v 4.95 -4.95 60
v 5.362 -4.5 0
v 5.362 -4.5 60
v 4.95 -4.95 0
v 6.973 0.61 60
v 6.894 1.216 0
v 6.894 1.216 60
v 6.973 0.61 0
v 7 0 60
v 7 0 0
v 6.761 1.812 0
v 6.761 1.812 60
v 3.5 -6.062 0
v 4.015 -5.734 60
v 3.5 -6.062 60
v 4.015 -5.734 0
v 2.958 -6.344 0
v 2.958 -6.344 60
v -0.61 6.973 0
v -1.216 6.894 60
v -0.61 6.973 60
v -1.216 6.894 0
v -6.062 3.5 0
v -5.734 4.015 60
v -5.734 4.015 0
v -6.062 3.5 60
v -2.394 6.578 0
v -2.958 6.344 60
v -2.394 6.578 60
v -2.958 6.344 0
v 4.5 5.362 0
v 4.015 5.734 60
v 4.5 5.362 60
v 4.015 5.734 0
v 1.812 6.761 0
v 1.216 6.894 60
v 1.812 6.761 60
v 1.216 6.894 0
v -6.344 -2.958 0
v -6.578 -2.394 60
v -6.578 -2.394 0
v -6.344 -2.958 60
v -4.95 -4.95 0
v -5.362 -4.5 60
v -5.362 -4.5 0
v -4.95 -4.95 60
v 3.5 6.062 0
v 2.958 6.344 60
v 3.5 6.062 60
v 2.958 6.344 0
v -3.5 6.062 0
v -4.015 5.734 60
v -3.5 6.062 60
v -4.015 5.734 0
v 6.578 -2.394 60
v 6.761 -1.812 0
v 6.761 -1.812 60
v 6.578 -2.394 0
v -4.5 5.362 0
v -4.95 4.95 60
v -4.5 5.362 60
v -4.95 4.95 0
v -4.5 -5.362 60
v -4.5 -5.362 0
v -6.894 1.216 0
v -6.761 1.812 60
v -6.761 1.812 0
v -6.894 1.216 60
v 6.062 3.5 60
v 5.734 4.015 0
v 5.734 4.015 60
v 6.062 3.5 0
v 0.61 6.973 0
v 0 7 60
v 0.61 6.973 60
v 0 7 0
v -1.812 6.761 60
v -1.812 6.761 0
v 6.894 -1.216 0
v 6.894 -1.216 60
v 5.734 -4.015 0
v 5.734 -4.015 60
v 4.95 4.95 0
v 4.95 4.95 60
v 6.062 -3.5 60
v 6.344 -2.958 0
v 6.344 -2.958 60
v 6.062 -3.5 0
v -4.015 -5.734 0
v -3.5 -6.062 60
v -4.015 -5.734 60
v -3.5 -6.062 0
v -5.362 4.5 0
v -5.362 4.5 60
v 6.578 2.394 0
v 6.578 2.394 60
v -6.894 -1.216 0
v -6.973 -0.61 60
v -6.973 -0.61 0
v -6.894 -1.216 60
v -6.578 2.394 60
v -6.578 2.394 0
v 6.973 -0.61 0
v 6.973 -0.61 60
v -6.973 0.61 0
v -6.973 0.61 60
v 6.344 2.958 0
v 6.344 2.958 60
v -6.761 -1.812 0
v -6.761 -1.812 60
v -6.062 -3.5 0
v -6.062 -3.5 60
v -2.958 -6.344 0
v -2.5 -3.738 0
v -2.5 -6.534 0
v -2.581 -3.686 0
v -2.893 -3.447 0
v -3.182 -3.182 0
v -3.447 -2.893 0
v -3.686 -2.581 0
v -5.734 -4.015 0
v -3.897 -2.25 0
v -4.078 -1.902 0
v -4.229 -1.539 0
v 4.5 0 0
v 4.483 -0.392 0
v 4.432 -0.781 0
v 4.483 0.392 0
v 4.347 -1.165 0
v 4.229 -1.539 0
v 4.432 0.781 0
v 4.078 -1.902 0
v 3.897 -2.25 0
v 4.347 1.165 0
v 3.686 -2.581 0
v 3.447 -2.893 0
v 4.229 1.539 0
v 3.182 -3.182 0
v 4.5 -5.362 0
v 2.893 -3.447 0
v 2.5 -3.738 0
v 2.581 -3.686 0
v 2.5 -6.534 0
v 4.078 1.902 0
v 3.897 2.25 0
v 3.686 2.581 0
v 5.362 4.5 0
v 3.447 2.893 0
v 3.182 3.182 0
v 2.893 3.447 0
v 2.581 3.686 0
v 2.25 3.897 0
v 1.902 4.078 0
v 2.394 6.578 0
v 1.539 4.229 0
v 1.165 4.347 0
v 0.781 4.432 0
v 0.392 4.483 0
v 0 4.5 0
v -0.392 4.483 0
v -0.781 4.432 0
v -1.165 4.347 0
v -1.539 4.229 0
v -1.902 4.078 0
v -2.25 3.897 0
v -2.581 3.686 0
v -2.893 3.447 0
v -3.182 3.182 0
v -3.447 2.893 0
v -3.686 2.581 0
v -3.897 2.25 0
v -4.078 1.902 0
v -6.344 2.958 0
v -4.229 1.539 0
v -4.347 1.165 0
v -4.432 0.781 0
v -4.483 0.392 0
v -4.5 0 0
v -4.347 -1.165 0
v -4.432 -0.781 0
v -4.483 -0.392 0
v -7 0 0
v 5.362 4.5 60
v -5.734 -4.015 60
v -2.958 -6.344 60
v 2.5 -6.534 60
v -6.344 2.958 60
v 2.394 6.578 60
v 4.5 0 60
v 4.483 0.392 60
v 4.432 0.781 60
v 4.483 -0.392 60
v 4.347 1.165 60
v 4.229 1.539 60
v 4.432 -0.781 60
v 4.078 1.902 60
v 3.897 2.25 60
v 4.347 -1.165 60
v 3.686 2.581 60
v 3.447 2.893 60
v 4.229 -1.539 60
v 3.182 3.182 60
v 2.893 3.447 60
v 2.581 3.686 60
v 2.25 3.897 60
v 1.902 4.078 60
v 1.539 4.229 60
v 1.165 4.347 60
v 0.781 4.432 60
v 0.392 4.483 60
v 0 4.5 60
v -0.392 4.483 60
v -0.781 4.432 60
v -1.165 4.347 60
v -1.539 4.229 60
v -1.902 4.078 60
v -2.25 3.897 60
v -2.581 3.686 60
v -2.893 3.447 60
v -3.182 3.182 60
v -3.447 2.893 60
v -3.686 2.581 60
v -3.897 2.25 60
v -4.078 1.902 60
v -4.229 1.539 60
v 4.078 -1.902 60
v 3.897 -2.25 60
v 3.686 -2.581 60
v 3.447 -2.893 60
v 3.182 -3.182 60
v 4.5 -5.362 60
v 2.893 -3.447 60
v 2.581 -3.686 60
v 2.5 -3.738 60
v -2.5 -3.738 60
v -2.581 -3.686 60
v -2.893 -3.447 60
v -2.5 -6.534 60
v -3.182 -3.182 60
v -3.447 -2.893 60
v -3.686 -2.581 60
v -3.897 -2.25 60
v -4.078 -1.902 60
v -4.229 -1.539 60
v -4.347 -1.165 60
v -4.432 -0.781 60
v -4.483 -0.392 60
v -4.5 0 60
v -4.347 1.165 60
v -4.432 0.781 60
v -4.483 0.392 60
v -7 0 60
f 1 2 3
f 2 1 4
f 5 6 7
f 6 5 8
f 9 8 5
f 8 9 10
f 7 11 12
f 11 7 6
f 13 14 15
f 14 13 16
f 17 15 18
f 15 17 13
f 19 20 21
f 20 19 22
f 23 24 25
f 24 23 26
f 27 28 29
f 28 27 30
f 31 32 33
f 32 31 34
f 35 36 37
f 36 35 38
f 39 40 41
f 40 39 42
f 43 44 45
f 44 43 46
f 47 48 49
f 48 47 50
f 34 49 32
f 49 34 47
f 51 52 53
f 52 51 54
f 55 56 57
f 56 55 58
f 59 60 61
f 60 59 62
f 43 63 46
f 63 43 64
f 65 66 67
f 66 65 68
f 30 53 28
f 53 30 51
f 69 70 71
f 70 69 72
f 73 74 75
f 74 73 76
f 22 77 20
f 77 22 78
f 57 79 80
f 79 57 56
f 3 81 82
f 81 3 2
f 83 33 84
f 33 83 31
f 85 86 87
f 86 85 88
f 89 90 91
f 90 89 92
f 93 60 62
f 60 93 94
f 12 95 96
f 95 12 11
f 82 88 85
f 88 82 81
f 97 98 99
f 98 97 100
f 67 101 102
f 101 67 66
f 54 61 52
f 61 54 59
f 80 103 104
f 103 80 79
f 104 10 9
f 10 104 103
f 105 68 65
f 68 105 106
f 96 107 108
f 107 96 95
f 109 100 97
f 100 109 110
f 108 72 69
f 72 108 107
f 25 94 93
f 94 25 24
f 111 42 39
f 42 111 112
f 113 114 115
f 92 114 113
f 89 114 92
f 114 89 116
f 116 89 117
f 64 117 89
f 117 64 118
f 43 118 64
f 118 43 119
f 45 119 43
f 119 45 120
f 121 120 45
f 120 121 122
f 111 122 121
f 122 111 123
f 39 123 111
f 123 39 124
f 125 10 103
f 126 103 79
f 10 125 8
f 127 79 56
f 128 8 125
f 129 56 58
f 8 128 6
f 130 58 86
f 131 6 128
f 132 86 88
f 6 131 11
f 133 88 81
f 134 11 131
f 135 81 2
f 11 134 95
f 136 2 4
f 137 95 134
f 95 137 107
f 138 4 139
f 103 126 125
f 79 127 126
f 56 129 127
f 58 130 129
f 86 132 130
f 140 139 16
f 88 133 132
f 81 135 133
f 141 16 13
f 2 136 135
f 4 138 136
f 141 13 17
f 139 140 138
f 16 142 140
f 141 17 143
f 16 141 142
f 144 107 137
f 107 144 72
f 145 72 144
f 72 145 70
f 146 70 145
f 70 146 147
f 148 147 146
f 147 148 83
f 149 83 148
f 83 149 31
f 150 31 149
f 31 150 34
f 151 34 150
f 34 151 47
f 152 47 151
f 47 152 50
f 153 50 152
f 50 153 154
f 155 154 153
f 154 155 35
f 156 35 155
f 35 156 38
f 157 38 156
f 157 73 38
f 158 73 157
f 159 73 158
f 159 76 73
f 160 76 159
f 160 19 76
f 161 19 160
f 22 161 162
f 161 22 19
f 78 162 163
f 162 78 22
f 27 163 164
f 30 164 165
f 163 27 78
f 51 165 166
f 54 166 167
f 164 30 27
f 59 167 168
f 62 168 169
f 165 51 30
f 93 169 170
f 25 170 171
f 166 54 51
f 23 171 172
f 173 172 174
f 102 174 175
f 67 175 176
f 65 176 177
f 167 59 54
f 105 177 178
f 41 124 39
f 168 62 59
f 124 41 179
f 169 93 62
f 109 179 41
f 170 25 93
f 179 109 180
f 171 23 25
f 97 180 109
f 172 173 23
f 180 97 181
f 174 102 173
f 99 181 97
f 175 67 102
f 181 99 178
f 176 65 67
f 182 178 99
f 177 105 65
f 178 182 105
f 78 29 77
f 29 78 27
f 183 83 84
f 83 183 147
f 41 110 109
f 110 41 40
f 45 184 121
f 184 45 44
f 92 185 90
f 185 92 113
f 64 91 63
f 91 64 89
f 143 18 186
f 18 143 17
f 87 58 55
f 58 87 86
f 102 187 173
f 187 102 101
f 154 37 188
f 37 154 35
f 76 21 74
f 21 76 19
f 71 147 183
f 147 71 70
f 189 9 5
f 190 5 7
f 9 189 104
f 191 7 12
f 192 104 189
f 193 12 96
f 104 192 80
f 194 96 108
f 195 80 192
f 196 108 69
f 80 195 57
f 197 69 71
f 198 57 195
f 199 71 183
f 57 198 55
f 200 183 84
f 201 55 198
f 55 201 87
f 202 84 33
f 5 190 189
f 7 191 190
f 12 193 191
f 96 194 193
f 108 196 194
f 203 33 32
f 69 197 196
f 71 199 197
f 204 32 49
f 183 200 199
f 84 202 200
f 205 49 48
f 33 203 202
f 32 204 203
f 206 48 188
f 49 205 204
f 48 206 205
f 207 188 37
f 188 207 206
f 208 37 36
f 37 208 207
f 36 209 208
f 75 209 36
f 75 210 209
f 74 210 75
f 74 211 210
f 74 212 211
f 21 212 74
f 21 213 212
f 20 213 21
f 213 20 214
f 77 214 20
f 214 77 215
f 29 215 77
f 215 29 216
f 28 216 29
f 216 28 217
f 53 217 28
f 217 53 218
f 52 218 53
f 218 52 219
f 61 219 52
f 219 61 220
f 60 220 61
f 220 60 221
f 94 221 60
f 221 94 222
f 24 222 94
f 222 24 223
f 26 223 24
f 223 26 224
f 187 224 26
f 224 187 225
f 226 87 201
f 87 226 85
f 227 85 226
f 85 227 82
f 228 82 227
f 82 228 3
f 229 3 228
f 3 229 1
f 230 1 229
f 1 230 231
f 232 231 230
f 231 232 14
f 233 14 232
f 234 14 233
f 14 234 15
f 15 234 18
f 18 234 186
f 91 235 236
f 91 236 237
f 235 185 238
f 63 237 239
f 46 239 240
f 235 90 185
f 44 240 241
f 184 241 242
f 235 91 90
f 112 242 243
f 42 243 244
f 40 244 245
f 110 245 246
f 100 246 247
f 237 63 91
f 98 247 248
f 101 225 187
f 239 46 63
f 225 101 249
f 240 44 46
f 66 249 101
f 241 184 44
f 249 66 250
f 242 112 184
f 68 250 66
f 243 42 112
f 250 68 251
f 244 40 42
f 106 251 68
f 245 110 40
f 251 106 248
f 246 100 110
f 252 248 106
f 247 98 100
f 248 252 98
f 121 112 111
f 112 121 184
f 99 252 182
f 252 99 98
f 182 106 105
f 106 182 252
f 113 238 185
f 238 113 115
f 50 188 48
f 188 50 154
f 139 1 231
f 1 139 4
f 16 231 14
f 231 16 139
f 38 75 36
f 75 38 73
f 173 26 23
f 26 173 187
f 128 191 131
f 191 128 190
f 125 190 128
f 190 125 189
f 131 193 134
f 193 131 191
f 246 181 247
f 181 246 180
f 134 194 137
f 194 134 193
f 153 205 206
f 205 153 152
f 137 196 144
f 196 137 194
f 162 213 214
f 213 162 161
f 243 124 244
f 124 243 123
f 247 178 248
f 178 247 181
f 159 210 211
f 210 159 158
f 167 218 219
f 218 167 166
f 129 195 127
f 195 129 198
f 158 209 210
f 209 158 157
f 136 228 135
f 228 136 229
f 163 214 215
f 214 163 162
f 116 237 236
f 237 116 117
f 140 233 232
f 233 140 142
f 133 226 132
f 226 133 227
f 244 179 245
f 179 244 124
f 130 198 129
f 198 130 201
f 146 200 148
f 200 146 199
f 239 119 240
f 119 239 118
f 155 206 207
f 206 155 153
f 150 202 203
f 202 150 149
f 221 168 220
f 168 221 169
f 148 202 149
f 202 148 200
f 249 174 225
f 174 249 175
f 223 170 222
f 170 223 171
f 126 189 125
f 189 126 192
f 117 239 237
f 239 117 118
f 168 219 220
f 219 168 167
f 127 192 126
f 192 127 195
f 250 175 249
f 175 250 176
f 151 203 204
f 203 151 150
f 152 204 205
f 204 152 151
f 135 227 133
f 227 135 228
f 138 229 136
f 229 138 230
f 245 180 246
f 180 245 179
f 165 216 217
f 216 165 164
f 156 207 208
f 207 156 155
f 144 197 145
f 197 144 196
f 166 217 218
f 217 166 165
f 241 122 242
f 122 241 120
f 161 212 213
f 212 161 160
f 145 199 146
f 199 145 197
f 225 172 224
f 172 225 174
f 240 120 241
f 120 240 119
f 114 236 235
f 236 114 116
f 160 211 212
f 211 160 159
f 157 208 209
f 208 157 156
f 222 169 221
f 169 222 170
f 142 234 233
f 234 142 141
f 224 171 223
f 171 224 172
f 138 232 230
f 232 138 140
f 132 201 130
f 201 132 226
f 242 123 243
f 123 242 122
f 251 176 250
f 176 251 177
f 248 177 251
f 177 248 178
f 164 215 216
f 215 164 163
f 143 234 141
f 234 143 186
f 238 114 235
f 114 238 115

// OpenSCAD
// Pixel pusher: seats a bullet pixel through a strap pass-hole or flange
// pocket (fingers don't fit Ø17/Ø14.5). Ring face bears on the flange rim
// around the wire exit; side slot lets the wires escape. Print upright.
$fn = 72;
difference() {
    cylinder(h = 60, d = 14.0);
    translate([0, 0, -0.1]) cylinder(h = 60.2, d = 9.0);
    translate([-2.5, -7.5, -0.1]) cube([5, 7.5, 60.2]);   // wire slot
}
